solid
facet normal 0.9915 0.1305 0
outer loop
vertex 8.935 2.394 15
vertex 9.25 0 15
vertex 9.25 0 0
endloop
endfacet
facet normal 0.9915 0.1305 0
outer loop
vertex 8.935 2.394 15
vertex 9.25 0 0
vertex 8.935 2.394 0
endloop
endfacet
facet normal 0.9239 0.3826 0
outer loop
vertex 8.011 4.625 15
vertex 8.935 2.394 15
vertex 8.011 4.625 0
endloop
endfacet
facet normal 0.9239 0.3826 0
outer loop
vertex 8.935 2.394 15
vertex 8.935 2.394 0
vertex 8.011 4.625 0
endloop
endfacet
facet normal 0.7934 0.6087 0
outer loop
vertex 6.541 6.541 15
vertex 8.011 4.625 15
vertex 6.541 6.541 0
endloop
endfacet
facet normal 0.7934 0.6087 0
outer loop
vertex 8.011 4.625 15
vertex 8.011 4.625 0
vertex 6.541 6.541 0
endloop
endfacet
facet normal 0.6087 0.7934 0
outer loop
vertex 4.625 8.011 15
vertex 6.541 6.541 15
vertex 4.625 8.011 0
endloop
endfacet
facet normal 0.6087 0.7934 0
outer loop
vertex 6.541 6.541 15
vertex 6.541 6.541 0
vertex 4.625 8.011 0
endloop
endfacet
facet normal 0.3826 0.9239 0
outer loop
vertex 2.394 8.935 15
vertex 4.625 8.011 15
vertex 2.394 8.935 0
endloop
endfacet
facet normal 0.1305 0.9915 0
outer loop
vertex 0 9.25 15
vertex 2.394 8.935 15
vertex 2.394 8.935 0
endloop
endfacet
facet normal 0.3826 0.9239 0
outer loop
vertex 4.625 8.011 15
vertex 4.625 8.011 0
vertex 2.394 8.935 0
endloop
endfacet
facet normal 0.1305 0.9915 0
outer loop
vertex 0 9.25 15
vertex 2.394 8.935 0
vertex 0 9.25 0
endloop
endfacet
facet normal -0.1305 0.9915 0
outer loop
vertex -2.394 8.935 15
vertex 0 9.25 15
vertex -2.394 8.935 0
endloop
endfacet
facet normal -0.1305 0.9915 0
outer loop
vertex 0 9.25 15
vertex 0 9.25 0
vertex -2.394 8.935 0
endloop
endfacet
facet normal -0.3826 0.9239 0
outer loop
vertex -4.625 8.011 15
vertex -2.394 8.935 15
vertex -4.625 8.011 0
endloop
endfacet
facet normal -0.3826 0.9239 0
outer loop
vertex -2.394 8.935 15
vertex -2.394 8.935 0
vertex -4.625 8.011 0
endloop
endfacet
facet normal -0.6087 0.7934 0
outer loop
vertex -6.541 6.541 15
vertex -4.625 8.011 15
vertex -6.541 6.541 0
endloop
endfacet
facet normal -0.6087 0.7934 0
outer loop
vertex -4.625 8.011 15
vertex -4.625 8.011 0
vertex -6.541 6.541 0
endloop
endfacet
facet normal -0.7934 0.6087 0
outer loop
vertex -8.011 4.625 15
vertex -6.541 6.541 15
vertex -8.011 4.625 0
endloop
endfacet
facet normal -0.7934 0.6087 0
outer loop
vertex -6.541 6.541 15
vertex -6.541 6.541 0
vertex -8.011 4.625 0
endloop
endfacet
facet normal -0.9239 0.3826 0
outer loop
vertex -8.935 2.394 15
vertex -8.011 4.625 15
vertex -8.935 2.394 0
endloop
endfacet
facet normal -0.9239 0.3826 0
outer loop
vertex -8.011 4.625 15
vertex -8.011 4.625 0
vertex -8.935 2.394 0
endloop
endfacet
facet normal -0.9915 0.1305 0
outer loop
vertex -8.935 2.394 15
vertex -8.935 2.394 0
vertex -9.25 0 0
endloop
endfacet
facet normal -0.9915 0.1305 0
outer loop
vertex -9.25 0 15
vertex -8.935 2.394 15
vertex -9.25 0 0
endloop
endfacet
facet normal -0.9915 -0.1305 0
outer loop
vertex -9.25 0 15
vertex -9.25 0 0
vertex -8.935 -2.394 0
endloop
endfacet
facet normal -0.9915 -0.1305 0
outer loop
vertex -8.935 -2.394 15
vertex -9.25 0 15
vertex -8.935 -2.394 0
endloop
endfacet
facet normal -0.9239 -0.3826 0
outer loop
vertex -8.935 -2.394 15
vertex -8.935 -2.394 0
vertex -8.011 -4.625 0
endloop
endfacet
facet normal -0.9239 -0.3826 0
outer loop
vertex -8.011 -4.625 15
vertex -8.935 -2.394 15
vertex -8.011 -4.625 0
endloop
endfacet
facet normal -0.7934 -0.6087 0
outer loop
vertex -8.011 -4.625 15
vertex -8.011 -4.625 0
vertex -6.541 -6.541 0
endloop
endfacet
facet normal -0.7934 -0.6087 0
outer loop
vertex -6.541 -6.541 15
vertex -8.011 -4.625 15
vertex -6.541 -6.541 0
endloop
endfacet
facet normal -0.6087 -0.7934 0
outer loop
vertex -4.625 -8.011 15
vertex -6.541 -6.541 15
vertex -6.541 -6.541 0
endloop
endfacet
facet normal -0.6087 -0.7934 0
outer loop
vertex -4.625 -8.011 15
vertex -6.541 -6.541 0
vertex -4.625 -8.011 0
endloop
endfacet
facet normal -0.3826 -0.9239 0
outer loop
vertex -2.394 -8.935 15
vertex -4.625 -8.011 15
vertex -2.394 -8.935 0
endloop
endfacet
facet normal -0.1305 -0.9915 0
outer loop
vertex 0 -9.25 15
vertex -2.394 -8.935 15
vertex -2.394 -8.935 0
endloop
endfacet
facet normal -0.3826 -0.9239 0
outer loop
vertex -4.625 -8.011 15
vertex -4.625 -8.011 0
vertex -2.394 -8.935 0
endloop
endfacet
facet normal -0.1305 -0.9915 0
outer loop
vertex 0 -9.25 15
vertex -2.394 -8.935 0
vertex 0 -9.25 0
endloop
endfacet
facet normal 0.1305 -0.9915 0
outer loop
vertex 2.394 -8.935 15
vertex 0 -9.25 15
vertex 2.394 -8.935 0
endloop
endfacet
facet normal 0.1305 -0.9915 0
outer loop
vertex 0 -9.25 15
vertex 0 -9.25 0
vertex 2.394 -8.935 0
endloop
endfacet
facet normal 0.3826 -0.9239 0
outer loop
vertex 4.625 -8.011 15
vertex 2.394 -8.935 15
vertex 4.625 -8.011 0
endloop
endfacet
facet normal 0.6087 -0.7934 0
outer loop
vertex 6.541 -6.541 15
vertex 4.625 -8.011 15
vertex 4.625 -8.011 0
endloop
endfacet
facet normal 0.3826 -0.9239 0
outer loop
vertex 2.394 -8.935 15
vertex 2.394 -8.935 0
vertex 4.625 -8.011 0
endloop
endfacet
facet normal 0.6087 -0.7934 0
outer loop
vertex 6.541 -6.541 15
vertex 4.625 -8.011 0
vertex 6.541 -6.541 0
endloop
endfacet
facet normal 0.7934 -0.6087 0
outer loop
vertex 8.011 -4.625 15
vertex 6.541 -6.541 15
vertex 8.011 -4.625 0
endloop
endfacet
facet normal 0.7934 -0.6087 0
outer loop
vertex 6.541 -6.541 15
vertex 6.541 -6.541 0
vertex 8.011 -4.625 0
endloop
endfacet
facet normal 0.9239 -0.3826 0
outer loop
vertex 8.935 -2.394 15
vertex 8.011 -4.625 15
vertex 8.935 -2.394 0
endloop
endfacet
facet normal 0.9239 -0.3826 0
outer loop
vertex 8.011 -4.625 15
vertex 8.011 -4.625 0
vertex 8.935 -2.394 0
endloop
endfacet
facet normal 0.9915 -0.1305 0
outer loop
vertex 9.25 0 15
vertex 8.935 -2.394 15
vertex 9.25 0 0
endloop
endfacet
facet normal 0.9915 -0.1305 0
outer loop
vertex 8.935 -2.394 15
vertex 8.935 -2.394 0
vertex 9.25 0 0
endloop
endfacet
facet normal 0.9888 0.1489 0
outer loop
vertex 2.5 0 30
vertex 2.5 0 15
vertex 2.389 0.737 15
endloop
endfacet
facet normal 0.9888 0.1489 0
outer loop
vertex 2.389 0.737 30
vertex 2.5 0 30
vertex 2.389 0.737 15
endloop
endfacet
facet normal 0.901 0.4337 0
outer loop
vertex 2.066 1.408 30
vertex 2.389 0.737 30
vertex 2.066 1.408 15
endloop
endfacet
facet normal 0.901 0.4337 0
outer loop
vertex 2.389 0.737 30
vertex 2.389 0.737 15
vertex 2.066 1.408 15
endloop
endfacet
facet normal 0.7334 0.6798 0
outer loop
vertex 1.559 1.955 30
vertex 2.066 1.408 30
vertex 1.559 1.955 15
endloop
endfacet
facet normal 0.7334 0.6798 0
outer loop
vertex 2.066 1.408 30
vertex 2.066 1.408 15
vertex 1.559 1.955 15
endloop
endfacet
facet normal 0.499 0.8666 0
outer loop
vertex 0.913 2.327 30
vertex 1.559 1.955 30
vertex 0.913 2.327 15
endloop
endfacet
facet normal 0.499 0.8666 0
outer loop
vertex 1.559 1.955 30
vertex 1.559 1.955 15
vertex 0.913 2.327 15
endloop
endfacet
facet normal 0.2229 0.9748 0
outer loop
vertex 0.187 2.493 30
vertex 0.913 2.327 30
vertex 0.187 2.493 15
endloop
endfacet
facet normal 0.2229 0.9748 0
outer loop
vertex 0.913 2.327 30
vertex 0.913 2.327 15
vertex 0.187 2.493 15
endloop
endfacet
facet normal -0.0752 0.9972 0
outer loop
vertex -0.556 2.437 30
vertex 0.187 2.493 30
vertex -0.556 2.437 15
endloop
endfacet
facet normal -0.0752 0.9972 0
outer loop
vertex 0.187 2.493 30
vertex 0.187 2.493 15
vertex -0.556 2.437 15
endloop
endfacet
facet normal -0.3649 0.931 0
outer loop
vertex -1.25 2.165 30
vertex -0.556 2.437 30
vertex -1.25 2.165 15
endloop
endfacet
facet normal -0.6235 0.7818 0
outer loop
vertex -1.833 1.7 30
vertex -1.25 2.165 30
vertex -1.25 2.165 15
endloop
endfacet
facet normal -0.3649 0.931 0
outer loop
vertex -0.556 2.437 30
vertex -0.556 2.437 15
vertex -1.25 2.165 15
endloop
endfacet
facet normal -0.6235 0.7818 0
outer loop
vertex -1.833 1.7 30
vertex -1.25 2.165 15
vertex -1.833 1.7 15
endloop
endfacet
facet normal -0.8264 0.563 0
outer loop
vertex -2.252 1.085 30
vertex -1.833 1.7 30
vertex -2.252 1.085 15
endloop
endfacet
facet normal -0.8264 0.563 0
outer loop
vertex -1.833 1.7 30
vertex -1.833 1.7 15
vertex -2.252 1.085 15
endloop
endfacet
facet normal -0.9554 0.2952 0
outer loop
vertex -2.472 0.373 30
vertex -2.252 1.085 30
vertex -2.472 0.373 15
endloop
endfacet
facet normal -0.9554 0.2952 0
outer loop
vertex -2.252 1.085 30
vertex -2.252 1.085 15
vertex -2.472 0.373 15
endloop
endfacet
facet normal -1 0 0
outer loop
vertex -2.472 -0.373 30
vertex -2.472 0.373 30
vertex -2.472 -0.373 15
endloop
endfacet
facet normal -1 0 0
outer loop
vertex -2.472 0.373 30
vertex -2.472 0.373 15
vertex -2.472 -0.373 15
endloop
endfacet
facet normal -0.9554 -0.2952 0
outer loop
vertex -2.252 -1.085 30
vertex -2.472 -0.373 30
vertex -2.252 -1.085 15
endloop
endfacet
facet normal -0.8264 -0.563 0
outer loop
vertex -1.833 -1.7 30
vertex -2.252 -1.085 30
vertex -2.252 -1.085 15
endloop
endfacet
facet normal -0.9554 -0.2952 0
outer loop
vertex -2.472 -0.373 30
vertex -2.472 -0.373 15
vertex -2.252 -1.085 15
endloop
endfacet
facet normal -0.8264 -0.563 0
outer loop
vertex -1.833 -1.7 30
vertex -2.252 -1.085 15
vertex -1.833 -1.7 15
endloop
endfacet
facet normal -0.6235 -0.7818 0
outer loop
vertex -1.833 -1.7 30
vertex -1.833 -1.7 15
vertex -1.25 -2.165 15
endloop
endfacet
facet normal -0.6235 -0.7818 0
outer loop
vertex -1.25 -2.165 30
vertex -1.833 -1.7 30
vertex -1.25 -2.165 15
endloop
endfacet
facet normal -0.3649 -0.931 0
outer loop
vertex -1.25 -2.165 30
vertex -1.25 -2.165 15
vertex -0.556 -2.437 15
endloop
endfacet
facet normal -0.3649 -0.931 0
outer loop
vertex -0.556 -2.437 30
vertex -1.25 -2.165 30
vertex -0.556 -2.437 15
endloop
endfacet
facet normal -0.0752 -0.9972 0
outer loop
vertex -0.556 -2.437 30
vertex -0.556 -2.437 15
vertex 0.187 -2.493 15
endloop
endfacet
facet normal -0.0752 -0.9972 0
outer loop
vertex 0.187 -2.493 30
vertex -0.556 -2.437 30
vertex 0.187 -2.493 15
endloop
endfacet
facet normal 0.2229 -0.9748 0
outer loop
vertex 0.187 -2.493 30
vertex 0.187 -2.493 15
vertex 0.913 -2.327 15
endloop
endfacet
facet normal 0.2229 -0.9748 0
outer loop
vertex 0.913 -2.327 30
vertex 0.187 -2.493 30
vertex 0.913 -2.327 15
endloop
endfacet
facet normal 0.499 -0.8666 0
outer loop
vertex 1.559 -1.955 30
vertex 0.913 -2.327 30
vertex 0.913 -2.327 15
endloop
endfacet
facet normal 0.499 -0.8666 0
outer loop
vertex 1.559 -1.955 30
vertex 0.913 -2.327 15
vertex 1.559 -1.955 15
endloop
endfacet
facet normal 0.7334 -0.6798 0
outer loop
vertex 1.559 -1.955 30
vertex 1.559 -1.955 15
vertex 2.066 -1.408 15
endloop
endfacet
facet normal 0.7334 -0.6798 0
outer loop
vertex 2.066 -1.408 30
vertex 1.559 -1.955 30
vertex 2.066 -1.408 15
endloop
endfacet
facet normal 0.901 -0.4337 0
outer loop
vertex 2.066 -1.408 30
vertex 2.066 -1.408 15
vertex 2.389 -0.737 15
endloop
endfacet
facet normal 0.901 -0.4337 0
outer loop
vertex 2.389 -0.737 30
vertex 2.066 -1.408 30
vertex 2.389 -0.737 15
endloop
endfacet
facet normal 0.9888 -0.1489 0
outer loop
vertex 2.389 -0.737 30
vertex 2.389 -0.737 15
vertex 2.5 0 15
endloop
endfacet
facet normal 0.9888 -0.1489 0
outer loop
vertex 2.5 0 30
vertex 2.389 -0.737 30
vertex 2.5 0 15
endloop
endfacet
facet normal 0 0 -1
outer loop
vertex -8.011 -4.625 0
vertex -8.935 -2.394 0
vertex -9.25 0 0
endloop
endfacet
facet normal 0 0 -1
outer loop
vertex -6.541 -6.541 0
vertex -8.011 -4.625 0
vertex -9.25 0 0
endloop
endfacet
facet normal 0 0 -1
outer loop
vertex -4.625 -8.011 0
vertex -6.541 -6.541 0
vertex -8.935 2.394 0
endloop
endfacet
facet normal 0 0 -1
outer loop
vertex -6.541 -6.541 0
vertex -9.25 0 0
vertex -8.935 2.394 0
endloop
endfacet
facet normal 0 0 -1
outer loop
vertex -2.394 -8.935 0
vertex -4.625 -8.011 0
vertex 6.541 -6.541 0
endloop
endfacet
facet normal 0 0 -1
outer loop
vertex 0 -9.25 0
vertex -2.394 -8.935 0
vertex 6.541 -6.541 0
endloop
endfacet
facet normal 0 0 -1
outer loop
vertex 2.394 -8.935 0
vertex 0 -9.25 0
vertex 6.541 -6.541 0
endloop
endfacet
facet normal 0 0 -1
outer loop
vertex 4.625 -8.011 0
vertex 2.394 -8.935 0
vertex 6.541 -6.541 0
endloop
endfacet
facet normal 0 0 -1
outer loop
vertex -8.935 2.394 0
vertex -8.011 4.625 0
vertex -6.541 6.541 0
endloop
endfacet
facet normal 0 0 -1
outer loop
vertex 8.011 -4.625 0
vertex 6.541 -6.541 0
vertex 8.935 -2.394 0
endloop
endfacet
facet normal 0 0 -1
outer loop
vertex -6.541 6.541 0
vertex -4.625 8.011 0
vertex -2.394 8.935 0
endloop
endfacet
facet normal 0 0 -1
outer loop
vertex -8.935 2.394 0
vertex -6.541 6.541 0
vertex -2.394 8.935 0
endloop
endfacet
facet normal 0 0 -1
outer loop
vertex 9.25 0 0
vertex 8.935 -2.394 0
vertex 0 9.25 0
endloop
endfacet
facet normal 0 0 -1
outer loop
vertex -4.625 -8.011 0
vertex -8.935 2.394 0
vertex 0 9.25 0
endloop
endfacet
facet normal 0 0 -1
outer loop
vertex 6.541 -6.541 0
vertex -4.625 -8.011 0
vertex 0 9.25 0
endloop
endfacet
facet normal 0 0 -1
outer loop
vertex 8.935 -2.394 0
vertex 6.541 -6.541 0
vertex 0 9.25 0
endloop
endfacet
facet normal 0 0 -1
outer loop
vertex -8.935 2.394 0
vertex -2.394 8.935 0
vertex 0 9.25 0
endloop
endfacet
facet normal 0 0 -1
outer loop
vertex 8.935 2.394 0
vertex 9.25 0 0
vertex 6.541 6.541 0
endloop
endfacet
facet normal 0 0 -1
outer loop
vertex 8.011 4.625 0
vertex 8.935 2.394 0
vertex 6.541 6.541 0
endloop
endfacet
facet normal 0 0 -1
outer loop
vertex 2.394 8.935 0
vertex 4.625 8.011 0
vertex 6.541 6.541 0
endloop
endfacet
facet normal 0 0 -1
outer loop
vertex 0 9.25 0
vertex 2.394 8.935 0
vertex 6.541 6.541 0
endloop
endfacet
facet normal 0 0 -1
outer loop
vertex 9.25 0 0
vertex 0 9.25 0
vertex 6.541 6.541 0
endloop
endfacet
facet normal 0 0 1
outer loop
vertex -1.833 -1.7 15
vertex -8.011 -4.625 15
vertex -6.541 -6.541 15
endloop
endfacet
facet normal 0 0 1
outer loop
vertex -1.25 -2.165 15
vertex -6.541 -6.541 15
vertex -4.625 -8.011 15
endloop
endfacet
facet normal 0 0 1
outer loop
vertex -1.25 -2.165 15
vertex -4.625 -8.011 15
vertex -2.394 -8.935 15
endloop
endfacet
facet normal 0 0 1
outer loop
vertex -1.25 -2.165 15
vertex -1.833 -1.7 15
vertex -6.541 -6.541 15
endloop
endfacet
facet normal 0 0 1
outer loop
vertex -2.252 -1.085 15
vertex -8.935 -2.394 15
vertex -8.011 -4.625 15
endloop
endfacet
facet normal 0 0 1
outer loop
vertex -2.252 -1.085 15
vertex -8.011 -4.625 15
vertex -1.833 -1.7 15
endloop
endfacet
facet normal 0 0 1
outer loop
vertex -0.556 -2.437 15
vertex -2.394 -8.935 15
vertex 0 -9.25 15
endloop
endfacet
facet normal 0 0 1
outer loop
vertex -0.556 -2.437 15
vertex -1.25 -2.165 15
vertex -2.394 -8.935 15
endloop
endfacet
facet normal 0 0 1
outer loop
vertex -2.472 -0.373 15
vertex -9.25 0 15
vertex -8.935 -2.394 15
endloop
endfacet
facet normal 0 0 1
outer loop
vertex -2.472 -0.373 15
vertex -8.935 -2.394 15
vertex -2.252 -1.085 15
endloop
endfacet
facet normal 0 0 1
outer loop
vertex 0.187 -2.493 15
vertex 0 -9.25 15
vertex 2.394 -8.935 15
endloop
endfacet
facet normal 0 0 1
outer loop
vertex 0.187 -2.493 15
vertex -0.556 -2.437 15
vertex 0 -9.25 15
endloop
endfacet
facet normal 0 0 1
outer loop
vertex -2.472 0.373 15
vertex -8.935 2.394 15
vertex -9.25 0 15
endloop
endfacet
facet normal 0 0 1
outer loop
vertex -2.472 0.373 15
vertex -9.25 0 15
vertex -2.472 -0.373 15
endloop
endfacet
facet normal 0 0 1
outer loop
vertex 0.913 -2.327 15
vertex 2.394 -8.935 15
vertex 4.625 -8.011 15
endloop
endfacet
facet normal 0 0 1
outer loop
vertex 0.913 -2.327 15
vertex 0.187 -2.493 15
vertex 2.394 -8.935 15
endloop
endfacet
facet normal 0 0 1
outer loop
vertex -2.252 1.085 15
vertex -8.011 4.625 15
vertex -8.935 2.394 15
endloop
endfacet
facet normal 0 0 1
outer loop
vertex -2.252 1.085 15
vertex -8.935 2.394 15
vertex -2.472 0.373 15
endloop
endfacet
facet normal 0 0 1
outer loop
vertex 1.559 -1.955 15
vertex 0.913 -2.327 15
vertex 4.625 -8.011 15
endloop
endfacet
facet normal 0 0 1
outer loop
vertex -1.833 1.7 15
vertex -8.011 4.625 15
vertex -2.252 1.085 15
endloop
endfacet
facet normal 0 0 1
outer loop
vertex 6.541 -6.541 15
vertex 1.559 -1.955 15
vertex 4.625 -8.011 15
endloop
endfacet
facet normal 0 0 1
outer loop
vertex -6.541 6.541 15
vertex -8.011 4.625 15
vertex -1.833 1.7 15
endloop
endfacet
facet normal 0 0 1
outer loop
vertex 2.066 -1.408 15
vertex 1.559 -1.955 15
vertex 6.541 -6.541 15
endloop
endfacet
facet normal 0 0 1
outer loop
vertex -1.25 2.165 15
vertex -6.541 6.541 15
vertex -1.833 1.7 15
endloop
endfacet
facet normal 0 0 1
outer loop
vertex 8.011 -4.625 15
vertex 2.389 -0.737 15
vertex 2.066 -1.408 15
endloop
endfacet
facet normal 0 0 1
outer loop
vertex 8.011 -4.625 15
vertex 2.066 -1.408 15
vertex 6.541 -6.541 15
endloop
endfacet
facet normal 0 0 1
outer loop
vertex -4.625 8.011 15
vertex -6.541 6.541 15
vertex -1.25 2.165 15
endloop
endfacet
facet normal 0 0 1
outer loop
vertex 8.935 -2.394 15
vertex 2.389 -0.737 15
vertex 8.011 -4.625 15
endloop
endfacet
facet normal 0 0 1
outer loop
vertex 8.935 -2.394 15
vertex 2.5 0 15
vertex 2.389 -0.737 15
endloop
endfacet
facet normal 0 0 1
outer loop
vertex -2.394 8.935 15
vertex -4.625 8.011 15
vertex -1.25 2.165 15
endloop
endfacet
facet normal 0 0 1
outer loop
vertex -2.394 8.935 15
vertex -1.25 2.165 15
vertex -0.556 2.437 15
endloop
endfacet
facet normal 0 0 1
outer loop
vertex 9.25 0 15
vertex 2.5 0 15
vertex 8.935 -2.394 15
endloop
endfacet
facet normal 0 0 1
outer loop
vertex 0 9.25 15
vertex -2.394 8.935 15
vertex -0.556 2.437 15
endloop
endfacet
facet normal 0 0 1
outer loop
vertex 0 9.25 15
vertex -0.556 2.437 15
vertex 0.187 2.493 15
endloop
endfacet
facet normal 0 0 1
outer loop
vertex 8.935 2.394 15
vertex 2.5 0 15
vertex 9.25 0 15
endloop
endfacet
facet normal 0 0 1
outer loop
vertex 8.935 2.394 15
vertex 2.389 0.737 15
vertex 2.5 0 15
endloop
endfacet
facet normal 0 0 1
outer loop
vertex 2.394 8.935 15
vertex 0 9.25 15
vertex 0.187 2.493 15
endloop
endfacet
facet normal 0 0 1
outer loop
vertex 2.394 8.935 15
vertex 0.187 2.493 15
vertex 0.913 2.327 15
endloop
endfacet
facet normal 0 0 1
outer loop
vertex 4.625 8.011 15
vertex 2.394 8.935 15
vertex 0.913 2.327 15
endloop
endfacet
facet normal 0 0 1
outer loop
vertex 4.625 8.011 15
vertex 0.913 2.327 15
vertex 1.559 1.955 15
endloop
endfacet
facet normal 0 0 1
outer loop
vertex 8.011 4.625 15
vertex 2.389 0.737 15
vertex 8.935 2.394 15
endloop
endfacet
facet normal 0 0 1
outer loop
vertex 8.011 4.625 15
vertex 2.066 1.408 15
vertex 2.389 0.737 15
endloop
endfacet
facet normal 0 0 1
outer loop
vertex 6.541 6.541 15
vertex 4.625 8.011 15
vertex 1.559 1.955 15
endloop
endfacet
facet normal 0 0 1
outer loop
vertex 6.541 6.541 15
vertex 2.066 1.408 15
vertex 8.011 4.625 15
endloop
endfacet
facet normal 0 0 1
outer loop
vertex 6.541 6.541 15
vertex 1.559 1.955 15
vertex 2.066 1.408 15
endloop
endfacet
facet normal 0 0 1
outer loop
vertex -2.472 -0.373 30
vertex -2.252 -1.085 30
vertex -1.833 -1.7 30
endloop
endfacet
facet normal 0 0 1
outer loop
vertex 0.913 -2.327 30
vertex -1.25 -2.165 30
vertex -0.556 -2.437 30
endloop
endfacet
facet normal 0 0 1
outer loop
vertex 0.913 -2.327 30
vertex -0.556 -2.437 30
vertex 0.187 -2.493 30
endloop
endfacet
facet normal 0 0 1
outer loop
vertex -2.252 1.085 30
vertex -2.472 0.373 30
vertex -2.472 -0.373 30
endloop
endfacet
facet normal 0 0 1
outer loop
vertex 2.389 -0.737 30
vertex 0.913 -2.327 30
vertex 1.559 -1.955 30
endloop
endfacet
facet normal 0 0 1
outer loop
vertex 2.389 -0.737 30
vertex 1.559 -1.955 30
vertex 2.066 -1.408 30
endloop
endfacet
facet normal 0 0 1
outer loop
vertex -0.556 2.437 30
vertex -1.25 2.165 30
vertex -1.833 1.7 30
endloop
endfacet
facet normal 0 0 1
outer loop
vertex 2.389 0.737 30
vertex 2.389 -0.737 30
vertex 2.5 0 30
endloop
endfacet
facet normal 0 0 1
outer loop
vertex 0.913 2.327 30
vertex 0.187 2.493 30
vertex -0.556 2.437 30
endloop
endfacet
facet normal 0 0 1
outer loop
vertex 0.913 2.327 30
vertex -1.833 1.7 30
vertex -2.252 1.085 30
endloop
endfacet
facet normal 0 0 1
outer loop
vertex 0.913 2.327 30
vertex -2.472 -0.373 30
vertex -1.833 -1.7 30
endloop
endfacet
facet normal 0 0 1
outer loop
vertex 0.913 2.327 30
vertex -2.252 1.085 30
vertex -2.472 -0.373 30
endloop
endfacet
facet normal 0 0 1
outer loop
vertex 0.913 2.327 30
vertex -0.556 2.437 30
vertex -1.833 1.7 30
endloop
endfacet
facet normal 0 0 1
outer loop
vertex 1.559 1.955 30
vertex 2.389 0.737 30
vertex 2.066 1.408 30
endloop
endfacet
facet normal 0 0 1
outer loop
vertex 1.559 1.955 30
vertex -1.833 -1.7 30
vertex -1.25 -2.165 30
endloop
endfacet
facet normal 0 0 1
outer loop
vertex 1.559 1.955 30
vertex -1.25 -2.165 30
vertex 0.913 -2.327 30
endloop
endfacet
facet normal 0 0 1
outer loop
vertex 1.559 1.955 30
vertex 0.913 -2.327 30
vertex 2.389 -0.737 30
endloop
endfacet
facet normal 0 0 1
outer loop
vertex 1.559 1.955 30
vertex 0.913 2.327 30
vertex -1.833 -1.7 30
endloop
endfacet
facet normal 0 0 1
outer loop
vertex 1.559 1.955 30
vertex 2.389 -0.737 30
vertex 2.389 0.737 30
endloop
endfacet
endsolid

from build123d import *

# Parameters (mm, degrees)
SKETCH001_R  = 2.5
PAD001_DEPTH = 30
SKETCH_R     = 9.25
PAD_DEPTH    = 15


with BuildPart() as pad001:
    # Sketch001 → Pad001 (new body)
    with BuildSketch(Plane.XY):
        Circle(SKETCH001_R)
    extrude(amount=PAD001_DEPTH)


with BuildPart() as fusion:
    # Sketch → Pad (new body)
    with BuildSketch(Plane.XY):
        Circle(SKETCH_R)
    extrude(amount=PAD_DEPTH)

    # Fusion: union Pad001
    add(pad001.part)


solid = fusion.part
